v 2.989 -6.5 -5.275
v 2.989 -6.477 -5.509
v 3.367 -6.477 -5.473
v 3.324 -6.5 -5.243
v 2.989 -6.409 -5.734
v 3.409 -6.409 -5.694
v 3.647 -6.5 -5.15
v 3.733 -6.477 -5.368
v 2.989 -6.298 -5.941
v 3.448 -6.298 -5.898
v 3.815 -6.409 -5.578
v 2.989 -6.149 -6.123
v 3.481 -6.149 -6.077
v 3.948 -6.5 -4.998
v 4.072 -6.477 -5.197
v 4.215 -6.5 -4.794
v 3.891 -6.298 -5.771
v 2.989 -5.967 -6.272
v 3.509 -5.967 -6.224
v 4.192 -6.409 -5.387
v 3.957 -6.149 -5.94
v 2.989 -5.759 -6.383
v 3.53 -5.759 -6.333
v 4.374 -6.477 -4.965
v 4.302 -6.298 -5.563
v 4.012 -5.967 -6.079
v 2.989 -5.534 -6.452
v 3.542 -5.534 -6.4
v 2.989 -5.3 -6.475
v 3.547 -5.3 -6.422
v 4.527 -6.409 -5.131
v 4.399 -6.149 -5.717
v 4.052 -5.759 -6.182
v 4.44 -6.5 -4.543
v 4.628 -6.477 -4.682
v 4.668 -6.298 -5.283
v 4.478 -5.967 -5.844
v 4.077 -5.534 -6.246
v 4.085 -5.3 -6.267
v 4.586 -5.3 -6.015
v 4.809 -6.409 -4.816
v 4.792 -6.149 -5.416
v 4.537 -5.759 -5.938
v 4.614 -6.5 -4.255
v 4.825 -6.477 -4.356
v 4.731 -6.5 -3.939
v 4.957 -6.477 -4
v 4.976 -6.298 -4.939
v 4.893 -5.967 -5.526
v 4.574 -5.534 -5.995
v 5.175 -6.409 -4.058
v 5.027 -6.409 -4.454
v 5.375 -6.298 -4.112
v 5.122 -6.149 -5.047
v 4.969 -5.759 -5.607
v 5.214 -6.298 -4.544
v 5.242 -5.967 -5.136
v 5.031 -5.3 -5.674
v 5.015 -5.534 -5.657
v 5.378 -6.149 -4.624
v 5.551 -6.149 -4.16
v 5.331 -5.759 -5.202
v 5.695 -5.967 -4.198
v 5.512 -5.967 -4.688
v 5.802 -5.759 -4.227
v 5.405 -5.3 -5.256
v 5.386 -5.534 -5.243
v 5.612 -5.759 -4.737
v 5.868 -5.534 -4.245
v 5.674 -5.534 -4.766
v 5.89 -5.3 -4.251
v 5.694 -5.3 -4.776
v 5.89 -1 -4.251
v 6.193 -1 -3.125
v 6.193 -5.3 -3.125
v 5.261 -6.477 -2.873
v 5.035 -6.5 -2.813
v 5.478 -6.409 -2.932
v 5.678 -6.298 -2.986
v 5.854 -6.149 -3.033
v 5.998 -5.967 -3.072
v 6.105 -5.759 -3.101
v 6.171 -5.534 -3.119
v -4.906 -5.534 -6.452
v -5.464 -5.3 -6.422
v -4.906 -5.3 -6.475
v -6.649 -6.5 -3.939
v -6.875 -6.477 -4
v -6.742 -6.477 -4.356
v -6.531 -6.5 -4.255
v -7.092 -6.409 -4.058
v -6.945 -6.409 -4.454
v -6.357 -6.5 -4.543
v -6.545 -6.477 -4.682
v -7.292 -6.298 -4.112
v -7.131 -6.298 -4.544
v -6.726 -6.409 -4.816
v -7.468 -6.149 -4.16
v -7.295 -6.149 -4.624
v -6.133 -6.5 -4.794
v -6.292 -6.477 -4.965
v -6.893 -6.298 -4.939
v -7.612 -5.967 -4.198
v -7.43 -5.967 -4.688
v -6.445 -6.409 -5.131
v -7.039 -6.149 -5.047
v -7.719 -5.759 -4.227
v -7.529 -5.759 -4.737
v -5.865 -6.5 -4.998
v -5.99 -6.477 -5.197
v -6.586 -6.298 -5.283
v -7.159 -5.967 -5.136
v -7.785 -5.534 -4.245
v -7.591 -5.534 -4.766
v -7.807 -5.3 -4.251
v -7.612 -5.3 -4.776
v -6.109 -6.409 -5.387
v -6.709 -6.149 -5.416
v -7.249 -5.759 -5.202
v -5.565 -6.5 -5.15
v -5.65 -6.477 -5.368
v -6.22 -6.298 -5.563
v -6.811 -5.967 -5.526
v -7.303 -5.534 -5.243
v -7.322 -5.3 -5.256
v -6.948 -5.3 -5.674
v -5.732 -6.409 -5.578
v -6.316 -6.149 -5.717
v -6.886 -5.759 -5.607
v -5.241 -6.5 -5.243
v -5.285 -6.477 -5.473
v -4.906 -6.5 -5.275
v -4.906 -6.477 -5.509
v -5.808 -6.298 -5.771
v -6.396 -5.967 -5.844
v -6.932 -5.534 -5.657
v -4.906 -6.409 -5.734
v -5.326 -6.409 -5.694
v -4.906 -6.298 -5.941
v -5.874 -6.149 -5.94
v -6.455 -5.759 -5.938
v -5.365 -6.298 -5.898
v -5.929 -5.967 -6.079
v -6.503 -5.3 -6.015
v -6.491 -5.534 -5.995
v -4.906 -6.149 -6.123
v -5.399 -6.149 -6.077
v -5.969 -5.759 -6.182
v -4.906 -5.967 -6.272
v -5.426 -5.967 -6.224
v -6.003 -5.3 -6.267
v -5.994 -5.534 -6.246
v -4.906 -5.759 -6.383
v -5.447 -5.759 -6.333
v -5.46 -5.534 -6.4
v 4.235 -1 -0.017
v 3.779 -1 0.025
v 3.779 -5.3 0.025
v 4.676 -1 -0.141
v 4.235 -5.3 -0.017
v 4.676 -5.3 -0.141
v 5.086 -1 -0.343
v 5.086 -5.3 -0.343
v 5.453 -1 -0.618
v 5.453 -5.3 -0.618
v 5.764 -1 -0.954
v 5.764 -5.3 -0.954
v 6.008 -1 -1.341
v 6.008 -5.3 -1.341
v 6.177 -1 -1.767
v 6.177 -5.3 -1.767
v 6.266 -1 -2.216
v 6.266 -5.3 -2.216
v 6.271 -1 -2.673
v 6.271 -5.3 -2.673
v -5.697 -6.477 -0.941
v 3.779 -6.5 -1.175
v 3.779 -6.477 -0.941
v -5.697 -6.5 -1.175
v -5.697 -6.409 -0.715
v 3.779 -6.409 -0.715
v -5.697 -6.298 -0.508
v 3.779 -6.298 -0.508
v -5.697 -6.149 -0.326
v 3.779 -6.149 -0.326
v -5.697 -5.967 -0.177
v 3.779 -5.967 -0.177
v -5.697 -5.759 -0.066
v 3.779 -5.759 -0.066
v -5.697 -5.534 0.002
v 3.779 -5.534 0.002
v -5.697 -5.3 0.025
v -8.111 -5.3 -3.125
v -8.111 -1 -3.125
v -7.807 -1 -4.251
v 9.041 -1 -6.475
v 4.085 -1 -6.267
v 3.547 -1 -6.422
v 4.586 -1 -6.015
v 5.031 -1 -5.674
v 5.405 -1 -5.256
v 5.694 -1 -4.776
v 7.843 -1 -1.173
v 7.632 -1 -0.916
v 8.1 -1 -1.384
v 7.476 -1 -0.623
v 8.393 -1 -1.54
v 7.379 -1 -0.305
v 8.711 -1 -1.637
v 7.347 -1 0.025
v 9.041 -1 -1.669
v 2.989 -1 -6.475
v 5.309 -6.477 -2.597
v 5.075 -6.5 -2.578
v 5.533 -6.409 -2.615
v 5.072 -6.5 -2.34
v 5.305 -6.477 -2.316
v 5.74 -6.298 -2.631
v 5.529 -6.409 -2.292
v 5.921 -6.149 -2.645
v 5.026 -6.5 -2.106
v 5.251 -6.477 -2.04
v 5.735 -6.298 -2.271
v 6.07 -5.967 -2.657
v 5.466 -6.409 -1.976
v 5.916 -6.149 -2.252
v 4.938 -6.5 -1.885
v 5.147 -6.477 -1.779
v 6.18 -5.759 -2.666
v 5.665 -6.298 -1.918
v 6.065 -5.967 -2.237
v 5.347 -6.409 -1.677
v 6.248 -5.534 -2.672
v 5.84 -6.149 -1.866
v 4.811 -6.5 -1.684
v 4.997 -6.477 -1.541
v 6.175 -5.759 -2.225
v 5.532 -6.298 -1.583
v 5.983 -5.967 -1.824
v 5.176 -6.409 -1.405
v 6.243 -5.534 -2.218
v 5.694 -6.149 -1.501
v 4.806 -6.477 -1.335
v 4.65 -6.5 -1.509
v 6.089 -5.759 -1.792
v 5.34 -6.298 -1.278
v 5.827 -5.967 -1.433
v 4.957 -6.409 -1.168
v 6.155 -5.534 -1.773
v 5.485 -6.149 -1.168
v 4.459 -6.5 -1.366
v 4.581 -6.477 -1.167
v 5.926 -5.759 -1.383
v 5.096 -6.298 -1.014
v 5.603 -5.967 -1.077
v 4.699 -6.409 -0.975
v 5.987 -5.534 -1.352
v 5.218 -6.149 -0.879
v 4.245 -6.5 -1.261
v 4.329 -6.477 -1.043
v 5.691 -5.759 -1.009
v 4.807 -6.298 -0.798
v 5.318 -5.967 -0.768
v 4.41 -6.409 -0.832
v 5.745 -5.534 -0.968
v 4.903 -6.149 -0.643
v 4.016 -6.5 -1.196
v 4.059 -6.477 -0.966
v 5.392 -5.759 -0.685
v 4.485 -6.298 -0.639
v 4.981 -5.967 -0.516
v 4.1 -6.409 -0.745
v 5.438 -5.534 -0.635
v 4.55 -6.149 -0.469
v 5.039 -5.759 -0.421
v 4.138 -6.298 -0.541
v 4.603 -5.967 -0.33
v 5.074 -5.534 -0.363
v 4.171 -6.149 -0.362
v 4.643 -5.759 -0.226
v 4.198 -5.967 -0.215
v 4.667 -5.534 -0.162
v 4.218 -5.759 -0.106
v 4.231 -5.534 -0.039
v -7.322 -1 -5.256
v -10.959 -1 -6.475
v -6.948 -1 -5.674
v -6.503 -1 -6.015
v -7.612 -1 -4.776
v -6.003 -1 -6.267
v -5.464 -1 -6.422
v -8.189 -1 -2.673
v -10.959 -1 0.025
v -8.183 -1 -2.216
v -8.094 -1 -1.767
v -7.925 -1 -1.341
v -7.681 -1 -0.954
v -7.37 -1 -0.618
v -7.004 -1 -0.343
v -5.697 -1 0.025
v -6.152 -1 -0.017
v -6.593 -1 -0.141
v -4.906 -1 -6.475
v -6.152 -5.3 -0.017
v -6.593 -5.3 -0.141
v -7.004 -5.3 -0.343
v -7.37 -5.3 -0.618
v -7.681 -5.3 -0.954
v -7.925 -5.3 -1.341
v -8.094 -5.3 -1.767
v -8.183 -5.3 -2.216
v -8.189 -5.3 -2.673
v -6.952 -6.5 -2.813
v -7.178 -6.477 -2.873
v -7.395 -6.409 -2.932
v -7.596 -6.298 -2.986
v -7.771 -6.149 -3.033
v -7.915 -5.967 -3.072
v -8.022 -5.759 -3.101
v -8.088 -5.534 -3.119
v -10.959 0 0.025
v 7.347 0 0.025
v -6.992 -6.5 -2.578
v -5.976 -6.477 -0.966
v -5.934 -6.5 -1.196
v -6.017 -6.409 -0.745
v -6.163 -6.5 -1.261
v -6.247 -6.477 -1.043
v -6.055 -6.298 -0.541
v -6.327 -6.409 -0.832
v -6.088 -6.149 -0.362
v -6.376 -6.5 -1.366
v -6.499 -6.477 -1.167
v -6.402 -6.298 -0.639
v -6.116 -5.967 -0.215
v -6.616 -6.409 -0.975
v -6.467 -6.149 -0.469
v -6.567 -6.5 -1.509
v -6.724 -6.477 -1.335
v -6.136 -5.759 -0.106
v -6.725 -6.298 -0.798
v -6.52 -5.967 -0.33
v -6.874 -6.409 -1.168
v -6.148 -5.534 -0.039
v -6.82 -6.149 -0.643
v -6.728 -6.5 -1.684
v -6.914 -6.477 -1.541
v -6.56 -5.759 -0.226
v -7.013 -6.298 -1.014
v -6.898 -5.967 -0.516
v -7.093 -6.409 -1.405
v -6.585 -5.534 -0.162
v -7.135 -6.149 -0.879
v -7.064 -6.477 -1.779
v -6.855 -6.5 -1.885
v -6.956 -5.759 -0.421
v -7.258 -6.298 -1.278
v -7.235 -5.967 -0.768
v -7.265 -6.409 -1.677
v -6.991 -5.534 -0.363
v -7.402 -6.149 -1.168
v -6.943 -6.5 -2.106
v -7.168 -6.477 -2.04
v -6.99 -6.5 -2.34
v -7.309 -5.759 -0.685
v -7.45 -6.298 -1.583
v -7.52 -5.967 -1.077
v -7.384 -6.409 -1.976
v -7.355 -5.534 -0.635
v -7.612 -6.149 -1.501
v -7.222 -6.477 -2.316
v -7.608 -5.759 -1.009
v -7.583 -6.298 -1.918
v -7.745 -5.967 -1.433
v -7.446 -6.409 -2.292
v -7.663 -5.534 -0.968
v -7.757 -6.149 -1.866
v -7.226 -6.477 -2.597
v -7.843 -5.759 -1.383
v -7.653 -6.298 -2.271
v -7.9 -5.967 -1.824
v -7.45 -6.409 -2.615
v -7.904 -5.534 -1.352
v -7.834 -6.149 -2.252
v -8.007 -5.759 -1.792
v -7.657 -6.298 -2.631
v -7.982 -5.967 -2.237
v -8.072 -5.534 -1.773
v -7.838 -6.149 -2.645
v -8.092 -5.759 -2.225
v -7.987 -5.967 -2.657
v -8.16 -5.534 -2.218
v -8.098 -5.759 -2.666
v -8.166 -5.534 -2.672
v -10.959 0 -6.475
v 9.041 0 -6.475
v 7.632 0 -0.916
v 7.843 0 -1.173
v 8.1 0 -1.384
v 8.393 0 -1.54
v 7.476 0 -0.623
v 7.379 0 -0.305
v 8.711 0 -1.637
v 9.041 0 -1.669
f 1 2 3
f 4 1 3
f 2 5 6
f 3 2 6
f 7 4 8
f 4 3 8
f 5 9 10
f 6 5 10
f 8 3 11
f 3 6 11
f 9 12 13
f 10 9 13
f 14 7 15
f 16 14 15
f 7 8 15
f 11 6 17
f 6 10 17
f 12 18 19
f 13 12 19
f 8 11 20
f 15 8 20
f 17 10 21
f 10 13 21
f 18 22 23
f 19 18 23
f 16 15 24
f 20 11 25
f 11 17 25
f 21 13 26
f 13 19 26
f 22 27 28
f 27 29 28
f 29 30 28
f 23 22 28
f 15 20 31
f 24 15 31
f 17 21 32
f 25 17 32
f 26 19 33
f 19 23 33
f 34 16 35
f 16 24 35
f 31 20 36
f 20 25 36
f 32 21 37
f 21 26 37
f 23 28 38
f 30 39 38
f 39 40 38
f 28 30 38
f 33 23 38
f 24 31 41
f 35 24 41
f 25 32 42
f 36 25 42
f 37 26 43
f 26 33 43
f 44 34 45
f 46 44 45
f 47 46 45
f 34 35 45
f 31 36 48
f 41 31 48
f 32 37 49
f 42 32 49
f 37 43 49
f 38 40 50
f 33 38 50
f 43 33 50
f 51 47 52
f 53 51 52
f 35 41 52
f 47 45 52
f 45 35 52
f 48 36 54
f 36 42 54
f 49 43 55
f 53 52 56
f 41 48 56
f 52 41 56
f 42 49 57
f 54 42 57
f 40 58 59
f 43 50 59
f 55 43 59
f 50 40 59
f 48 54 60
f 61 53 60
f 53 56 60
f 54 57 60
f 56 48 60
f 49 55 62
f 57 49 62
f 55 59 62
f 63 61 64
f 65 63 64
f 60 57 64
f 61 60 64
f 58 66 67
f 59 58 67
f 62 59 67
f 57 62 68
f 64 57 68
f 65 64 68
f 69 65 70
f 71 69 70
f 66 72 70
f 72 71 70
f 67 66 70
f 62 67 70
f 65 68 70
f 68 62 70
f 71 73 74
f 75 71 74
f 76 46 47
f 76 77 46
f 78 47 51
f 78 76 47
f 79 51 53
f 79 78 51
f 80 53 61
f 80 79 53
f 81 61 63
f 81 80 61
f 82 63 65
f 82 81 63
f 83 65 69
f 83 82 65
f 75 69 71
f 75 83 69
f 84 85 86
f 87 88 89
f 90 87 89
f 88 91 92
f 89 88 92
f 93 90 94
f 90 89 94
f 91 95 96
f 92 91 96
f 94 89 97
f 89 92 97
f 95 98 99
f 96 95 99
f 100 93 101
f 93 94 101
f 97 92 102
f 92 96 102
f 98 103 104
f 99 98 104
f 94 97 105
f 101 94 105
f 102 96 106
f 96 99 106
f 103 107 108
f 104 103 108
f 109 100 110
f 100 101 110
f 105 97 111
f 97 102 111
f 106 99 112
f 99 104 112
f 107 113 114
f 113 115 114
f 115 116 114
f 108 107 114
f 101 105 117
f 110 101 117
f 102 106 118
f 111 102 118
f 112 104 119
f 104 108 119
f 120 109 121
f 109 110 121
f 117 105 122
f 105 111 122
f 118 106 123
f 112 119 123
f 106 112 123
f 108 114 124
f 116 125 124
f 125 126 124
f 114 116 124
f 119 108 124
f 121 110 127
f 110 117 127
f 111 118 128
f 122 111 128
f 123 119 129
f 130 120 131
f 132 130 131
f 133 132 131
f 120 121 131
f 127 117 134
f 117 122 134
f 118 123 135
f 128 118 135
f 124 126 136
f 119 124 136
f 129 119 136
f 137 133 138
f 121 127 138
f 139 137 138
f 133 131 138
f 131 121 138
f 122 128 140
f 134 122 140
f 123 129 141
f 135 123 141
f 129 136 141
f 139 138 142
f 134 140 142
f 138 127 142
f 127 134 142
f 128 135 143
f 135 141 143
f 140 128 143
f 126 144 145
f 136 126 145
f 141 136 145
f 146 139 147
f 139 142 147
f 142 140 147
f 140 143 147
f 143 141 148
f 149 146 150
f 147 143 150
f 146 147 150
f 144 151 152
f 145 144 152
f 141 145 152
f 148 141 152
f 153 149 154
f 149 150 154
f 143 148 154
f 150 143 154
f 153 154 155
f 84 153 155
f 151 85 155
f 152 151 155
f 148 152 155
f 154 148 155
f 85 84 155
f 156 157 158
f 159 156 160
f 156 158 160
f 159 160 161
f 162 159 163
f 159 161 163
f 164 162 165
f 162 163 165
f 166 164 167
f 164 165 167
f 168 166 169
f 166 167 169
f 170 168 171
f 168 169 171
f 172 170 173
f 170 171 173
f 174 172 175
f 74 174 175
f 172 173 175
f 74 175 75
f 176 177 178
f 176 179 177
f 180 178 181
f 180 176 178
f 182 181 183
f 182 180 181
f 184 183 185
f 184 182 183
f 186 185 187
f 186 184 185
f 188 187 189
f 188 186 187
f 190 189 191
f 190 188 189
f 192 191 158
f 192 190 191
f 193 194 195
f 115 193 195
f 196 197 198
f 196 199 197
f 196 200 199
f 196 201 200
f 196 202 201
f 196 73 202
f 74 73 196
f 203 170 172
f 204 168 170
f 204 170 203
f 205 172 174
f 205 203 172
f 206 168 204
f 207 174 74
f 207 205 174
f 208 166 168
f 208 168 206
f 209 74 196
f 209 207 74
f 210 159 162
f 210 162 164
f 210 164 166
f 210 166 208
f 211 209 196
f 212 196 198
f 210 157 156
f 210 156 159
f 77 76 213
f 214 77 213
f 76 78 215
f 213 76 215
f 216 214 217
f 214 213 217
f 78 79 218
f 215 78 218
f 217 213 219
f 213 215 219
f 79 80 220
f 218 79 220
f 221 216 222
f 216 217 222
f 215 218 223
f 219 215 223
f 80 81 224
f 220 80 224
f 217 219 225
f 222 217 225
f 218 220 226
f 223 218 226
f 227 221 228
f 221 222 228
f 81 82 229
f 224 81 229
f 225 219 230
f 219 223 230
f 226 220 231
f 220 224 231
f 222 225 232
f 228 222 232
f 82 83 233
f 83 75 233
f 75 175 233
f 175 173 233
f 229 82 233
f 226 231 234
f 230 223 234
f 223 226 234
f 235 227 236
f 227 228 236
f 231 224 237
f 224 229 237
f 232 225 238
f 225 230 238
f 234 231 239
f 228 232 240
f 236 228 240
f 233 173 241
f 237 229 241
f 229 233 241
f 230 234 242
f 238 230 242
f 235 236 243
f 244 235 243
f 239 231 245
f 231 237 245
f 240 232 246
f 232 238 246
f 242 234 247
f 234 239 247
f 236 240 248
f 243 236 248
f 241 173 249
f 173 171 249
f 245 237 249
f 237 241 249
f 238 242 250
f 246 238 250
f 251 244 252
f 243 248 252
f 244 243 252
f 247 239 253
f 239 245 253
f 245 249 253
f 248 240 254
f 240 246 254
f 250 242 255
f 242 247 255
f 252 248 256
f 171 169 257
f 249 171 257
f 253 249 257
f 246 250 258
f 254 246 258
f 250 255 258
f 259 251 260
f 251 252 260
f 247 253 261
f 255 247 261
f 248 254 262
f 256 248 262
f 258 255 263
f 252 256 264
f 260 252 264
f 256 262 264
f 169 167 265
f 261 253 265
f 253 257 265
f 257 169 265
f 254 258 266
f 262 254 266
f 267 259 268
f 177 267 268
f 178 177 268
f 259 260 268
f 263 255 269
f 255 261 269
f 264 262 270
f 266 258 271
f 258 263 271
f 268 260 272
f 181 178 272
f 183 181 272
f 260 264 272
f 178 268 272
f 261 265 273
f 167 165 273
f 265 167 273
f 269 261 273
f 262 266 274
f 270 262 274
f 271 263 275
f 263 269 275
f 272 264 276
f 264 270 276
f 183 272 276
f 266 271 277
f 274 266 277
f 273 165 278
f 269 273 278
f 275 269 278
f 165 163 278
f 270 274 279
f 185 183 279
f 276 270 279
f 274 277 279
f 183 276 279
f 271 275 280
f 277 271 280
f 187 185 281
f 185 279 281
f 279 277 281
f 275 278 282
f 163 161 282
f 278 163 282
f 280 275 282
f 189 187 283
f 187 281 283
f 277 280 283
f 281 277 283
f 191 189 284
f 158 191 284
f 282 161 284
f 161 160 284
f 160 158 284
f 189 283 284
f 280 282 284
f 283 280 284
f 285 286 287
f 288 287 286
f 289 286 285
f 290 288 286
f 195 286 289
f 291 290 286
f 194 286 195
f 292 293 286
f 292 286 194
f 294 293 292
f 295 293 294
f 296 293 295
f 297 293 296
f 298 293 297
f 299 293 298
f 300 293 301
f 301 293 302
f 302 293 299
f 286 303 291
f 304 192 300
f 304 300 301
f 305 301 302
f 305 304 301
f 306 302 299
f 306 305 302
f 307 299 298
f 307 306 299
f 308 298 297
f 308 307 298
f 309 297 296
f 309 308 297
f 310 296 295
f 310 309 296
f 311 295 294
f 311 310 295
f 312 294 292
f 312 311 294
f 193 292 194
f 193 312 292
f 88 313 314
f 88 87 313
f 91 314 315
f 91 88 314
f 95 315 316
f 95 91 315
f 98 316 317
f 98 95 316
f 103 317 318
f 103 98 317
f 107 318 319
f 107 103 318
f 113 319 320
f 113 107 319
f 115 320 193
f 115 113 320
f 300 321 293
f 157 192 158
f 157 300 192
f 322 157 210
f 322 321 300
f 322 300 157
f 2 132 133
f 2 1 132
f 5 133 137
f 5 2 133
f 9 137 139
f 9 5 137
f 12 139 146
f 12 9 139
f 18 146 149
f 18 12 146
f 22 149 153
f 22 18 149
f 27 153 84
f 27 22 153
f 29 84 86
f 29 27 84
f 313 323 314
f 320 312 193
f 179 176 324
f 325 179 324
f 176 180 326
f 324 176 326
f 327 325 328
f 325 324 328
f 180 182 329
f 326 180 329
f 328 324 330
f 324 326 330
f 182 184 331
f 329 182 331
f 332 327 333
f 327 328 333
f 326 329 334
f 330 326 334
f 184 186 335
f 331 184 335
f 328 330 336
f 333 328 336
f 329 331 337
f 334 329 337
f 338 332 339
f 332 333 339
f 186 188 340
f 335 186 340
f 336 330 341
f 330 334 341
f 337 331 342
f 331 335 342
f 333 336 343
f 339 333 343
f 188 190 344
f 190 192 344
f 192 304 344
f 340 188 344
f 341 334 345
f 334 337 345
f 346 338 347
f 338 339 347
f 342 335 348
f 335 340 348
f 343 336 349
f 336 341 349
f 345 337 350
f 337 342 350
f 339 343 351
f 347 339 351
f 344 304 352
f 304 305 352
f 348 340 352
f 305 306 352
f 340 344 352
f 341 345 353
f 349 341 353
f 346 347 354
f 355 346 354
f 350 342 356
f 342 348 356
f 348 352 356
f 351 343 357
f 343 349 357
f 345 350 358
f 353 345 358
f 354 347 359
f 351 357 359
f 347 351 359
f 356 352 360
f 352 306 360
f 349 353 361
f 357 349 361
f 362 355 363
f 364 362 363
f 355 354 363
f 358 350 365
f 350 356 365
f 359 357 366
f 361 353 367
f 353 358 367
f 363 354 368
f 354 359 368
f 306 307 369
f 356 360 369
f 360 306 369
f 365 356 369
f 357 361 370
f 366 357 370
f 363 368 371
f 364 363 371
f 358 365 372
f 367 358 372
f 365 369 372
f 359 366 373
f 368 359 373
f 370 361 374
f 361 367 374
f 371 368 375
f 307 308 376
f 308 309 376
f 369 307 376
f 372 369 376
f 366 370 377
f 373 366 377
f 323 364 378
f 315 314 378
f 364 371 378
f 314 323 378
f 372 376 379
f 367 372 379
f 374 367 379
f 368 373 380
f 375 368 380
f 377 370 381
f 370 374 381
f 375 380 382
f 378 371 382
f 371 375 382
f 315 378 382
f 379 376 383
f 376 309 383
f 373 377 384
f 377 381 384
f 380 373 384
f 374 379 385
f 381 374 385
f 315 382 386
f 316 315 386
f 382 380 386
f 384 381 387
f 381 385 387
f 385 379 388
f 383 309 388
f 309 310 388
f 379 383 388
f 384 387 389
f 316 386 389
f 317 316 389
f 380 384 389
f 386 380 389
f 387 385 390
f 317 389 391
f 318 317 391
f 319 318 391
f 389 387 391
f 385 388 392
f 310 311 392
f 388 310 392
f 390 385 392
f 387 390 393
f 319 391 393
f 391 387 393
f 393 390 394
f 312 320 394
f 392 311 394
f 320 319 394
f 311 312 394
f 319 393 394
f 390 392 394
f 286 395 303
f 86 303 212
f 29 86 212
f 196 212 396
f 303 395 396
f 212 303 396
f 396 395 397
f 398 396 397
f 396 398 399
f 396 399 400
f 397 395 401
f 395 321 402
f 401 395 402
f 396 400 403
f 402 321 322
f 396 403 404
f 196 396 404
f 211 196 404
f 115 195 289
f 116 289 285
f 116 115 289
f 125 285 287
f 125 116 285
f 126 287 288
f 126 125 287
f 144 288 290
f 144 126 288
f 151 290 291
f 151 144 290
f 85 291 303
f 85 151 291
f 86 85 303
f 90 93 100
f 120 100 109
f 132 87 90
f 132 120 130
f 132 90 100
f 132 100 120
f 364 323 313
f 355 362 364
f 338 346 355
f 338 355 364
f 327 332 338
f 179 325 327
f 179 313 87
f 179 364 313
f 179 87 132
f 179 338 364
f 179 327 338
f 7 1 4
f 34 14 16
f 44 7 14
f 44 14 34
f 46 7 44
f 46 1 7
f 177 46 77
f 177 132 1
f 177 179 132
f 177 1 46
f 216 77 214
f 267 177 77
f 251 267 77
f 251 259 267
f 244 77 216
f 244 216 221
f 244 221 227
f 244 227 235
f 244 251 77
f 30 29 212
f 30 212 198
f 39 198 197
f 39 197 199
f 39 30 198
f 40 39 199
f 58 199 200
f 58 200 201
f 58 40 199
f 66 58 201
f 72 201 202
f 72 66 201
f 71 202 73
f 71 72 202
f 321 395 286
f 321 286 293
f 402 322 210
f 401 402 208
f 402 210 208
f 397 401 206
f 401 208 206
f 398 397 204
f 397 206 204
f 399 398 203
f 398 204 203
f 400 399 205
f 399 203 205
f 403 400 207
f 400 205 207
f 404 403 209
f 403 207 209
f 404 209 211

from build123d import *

# Parameters (mm, degrees)
F0_W      = 20
F0_H      = 8
F1_DEPTH  = 1
F3_DEPTH  = 5.5
F4_R      = 2.5
F5_R      = 3.0047096082
F6_R      = 1.2
F7_W      = 20
F7_H      = 1.5
F8_DEPTH  = 25
F9_R      = 1.6945445142
F10_DEPTH = 25


with BuildPart() as f1:
    # F0 (on Front) → F1 (new body)
    with BuildSketch(Plane.XZ):
        with Locations((-0.9586364031, -3.9746239682)):
            Rectangle(F0_W, F0_H)
    extrude(amount=F1_DEPTH)

    # F2 (on face) → F3 (join)
    with BuildSketch(Plane.XZ.offset(1)):
        Polygon((7.0413635969, 0.0253760318), (-8.9586364031, 0.0253760318), (-7.2086364031, -6.4746239682), (5.2913635969, -6.4746239682), align=None)
    extrude(amount=F3_DEPTH)

    # F4
    f4_edges = [f1.edges().sort_by_distance(p)[0] for p in [
        (7.041364, -3.75, 0.025376),
        (-8.958636, -3.75, 0.025376),
    ]]
    fillet(f4_edges, radius=F4_R)

    # F5
    f5_edges = [f1.edges().sort_by_distance(p)[0] for p in [
        (5.291364, -3.75, -6.474624),
        (-7.208636, -3.75, -6.474624),
    ]]
    fillet(f5_edges, radius=F5_R)

    # F6
    f6_edges = [f1.edges().sort_by_distance(p)[0] for p in [
        (6.04166, -6.5, -3.687808),
        (4.816347, -6.5, -5.854804),
        (5.763558, -6.5, -0.953906),
        (-0.958636, -6.5, -6.474624),
        (-0.958636, -6.5, 0.025376),
        (-6.73362, -6.5, -5.854804),
        (-7.680831, -6.5, -0.953906),
        (-7.958933, -6.5, -3.687808),
    ]]
    fillet(f6_edges, radius=F6_R)

    # F7 (on face) → F8 (cut)
    with BuildSketch(Plane.XZ.offset(1)):
        with Locations((-0.9586364031, -7.2246239682)):
            Rectangle(F7_W, F7_H)
    extrude(amount=-F8_DEPTH, mode=Mode.SUBTRACT)

    # F9 (on face) → F10 (cut)
    with BuildSketch(Plane.XZ.offset(1)):
        with Locations((9.0413635969, 0.0253760318)):
            Circle(F9_R)
    extrude(amount=-F10_DEPTH, mode=Mode.SUBTRACT)


solid = f1.part
